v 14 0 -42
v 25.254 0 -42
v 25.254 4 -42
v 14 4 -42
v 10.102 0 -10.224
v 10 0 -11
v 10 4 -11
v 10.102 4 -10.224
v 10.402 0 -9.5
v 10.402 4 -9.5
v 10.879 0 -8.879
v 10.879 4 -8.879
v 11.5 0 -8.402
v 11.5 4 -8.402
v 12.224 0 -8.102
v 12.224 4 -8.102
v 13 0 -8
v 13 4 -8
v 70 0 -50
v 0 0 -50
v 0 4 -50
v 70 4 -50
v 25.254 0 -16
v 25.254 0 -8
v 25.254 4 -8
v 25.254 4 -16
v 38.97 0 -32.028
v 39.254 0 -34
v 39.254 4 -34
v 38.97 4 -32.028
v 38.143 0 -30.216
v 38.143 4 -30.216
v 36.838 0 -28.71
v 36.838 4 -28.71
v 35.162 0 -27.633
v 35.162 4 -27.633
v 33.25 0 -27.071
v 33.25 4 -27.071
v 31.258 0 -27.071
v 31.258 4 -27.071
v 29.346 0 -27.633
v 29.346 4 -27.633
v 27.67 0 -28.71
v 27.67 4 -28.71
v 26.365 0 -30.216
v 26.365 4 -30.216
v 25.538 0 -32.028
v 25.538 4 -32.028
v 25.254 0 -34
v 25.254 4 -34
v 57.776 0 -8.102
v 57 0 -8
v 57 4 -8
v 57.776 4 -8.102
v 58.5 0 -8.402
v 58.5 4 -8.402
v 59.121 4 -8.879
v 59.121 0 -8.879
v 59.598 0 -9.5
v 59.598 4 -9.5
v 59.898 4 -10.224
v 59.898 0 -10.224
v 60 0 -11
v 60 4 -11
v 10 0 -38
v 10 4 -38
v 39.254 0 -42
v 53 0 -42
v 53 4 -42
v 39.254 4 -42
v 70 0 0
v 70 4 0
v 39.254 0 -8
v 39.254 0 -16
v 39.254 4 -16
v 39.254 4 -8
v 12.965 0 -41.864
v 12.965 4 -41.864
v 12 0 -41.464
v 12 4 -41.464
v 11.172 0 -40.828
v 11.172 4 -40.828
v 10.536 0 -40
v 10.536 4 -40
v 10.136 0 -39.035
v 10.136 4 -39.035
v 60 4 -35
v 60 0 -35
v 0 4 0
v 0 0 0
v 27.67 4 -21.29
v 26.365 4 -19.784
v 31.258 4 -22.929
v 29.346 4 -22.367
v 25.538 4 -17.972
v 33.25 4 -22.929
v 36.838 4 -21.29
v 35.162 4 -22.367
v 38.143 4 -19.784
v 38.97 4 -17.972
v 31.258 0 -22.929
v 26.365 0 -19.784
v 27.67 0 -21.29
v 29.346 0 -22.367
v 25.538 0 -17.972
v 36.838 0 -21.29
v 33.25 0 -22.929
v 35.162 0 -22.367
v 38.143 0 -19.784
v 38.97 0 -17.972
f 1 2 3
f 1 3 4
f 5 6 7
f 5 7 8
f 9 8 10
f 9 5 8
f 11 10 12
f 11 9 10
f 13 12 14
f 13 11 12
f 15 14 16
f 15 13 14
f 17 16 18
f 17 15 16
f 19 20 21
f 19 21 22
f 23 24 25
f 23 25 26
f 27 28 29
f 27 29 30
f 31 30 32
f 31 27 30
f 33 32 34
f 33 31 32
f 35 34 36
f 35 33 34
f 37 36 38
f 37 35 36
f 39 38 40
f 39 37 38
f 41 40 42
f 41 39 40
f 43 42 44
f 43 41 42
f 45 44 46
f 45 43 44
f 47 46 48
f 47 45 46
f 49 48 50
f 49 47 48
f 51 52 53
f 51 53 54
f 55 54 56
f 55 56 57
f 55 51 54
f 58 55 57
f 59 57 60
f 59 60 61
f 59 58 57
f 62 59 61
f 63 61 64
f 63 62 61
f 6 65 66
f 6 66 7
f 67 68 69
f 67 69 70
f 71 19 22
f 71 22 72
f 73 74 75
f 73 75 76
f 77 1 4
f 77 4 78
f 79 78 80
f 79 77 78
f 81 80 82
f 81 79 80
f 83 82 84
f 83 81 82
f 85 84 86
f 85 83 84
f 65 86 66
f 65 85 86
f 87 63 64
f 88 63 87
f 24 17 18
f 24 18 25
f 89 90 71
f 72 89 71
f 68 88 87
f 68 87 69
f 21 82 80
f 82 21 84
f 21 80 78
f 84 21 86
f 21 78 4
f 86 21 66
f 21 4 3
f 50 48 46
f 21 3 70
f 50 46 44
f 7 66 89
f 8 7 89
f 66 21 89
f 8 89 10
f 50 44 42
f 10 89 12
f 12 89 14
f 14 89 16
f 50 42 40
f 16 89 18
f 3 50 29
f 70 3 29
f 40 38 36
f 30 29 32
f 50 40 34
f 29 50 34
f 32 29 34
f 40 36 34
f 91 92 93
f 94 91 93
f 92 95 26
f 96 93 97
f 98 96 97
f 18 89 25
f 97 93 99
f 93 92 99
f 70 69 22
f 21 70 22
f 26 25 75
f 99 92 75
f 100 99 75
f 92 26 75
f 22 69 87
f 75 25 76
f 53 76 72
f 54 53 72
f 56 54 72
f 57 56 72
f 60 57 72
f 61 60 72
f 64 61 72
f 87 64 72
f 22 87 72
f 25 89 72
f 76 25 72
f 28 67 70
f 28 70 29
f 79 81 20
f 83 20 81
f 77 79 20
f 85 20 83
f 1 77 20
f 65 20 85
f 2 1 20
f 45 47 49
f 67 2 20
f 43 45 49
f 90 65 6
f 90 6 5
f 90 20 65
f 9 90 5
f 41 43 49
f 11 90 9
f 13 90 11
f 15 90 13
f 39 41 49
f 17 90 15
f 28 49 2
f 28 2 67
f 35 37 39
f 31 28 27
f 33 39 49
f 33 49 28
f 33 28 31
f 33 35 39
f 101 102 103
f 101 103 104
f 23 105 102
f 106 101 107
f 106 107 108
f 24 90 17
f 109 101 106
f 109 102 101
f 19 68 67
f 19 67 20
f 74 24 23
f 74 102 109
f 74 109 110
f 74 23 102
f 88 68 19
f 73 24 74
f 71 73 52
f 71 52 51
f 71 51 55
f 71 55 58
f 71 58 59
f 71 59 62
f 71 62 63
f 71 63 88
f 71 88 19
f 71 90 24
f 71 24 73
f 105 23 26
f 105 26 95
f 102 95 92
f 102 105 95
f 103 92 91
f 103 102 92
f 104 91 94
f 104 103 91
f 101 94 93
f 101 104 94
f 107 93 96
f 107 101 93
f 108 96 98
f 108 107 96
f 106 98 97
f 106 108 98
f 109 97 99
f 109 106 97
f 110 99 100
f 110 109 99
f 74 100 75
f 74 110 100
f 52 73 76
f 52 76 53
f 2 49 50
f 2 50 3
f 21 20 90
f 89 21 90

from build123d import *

# Parameters (mm, degrees)
F0_W     = 70
F0_H     = 50
F1_DEPTH = 4


with BuildPart() as f1:
    # F0 (on Front) → F1 (new body)
    with BuildSketch(Plane.XZ):
        with Locations((35, -25)):
            Rectangle(F0_W, F0_H)
        with BuildLine():
            ThreePointArc((10, -11), (10.87868, -8.87868), (13, -8))
            Line((13, -8), (25.253979, -8))
            Line((25.253979, -8), (25.253979, -16))
            ThreePointArc((25.253979, -16), (32.253979, -23), (39.253979, -16))
            Line((39.253979, -16), (39.253979, -8))
            Line((39.253979, -8), (57, -8))
            ThreePointArc((57, -8), (59.12132, -8.87868), (60, -11))
            Line((60, -11), (60, -35))
            Line((60, -35), (53, -42))
            Line((53, -42), (39.253979, -42))
            Line((39.253979, -42), (39.253979, -34))
            ThreePointArc((39.253979, -34), (32.253979, -27), (25.253979, -34))
            Line((25.253979, -34), (25.253979, -42))
            Line((25.253979, -42), (14, -42))
            ThreePointArc((14, -42), (11.171573, -40.828427), (10, -38))
            Line((10, -38), (10, -11))
        make_face(mode=Mode.SUBTRACT)
    extrude(amount=-F1_DEPTH)


solid = f1.part
